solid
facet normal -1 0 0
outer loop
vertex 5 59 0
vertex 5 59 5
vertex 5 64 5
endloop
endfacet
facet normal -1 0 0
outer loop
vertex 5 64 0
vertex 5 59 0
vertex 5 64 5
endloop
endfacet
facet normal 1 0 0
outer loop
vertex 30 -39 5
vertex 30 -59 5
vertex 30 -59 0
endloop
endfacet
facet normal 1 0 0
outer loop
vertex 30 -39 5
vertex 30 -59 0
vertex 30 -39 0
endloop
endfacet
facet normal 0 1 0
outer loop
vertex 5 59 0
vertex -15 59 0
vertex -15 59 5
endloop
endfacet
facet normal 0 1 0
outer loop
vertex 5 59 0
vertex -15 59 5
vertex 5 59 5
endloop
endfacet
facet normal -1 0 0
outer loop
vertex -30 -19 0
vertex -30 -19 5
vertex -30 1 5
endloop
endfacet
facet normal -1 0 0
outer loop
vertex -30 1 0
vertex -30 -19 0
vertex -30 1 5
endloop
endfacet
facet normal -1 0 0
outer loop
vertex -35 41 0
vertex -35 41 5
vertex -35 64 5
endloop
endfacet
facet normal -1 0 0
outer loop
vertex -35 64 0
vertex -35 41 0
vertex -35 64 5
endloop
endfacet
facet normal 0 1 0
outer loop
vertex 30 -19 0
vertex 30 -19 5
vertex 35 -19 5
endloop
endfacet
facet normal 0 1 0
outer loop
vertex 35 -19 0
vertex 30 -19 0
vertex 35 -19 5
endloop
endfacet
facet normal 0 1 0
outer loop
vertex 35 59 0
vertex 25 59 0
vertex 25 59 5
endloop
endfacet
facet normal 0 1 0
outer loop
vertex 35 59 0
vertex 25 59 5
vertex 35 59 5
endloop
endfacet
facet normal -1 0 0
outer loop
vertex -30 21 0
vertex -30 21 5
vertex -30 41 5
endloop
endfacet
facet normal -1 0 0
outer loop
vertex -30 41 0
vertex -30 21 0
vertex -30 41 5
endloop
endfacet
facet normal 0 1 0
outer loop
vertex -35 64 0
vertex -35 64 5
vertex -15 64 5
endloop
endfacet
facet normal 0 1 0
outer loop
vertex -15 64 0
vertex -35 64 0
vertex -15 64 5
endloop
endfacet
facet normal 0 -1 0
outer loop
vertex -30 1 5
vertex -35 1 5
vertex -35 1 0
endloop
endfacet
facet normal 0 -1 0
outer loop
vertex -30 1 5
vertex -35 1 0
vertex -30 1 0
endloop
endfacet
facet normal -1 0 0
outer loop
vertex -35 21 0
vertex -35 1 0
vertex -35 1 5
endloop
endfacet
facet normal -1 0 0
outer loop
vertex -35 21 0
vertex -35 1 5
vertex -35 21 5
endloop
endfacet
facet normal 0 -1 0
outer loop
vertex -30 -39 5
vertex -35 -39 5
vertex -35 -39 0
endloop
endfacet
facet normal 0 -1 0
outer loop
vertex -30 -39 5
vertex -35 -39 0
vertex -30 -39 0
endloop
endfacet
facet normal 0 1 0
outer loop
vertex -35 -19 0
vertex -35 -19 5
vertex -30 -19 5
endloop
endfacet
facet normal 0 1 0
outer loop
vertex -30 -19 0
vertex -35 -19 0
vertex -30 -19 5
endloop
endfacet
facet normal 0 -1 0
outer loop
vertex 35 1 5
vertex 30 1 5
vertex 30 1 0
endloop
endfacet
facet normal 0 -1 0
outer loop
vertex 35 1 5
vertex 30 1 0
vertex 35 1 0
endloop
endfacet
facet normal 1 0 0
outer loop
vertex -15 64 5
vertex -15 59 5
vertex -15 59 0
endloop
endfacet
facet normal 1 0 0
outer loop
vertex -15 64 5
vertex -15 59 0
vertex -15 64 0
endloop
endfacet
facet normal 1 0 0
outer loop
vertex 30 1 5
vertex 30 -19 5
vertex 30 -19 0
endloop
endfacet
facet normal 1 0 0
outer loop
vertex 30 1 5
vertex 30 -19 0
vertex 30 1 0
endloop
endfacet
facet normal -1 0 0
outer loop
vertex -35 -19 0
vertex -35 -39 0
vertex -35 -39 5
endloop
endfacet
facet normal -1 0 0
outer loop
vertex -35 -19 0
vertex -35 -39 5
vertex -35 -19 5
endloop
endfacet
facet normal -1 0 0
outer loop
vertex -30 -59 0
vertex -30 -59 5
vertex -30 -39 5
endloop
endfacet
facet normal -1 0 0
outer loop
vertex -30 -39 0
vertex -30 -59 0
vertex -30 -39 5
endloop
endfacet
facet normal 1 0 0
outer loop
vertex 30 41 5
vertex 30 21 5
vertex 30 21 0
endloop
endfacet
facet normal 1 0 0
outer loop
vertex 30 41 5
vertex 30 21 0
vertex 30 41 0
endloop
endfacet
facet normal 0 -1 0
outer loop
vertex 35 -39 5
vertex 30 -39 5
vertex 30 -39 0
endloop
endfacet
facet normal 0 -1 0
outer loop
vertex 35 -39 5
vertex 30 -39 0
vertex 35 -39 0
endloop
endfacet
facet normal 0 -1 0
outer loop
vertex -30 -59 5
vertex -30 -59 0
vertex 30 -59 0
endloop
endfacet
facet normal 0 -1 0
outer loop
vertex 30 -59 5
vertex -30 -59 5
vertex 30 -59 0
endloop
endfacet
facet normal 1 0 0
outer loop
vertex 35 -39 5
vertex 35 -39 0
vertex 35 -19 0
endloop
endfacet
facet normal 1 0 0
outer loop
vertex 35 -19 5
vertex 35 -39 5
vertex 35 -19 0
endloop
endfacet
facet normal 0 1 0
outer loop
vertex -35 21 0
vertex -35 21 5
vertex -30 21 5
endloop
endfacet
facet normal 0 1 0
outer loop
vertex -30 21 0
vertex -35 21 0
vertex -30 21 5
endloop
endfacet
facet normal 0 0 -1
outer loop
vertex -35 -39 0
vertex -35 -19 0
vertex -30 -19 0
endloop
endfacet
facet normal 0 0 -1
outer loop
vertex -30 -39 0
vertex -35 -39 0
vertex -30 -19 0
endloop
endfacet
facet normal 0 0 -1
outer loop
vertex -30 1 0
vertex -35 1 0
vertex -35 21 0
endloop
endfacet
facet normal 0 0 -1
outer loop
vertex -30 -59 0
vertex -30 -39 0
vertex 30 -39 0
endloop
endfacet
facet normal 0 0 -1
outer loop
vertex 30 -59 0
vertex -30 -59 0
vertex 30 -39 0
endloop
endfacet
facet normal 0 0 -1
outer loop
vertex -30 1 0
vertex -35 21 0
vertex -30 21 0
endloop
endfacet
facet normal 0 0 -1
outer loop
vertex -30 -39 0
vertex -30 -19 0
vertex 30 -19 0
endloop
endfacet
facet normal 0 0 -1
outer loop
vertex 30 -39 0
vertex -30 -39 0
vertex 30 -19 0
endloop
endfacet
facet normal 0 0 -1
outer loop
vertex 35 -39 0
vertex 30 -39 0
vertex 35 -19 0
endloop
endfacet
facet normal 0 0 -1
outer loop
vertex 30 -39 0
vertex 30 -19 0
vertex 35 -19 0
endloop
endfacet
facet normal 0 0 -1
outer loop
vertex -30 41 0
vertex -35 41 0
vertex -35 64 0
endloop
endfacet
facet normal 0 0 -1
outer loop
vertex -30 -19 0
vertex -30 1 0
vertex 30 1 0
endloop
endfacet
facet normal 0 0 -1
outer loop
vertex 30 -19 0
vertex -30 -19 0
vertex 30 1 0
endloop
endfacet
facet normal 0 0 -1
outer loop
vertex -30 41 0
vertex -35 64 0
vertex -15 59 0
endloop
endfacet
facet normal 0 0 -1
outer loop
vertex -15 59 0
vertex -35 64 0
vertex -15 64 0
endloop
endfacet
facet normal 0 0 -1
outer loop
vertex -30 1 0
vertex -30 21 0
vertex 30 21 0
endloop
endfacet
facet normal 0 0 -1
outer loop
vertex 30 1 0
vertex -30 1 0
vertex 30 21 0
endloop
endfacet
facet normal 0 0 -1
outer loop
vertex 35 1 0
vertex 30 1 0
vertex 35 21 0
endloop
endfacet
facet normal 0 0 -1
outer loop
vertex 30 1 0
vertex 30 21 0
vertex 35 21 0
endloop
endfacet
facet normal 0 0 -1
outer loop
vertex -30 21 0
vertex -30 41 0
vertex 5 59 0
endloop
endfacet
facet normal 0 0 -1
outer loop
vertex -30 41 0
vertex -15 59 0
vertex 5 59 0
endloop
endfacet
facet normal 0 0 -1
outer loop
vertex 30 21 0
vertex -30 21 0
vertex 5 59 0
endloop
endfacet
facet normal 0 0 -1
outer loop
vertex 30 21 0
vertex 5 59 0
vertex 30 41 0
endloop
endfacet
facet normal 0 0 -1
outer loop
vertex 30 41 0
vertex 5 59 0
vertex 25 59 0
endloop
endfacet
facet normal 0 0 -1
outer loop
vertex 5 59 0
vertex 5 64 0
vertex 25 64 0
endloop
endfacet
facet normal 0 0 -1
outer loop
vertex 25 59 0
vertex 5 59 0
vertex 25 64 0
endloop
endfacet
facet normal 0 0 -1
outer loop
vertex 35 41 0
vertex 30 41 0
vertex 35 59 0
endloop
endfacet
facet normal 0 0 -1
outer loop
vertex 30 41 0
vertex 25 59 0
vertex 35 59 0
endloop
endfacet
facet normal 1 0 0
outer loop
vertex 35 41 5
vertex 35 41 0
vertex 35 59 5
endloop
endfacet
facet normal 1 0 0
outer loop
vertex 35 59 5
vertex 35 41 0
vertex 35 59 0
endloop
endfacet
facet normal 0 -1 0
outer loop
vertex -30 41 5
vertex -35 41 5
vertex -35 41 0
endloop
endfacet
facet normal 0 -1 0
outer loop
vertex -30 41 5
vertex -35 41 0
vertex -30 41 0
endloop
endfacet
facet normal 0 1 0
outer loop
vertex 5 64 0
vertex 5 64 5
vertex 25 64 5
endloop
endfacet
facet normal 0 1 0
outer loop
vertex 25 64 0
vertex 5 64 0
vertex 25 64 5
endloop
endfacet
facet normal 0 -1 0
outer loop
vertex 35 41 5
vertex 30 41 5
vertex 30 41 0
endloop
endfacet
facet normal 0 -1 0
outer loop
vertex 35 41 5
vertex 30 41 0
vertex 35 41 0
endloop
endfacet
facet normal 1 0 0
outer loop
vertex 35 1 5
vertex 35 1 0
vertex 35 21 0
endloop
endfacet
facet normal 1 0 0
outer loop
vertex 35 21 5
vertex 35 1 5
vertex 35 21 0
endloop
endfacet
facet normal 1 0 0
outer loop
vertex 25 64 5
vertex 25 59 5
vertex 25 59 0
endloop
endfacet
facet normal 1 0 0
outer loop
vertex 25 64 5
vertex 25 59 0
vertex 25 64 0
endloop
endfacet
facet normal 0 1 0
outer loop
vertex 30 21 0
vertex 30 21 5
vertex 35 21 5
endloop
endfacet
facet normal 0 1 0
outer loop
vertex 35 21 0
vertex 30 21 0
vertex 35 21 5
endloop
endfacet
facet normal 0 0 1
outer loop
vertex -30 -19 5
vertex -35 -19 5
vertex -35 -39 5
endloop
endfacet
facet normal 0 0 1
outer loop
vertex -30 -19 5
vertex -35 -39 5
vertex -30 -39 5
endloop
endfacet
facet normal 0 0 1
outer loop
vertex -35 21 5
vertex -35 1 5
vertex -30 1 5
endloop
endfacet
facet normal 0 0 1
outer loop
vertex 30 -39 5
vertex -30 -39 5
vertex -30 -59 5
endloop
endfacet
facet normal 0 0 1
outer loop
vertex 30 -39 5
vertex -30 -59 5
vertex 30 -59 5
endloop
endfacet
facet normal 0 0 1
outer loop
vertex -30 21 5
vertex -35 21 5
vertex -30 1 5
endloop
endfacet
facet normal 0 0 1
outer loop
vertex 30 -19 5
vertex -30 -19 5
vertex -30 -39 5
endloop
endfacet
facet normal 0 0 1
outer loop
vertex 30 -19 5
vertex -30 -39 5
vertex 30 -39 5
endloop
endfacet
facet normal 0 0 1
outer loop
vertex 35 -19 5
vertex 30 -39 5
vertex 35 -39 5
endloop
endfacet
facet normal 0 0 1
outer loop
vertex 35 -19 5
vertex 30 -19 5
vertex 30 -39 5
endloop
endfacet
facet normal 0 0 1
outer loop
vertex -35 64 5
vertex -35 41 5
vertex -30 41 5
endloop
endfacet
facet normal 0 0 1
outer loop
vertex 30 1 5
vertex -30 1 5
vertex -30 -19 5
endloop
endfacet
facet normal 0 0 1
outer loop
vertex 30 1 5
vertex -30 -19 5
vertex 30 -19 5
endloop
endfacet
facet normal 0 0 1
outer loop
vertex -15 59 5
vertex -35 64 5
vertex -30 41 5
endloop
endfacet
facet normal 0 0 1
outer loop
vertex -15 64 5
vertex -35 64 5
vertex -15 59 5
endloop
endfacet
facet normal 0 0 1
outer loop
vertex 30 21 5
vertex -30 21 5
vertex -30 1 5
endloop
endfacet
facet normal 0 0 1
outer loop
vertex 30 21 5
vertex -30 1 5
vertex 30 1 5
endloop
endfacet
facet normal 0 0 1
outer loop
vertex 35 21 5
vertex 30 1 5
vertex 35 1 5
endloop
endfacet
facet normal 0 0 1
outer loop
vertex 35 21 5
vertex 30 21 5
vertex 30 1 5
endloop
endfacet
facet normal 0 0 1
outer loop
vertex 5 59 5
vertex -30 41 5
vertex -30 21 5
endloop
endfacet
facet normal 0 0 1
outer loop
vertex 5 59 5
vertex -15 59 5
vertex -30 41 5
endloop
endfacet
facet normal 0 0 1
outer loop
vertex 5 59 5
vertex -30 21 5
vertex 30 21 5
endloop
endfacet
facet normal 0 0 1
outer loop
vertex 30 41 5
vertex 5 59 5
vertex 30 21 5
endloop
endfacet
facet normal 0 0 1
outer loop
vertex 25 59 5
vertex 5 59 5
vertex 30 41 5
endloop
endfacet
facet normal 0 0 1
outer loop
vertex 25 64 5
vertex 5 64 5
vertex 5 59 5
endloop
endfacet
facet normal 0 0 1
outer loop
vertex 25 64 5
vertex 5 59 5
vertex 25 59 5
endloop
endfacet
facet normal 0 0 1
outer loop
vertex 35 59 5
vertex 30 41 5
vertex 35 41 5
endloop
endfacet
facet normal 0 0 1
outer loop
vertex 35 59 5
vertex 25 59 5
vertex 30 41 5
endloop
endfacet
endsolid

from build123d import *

# Parameters (mm, degrees)
SKETCH_1_W                      = 70
SKETCH_1_H                      = 118
EXTRUDE_1_DEPTH                 = 5
CUT_EXTRUDE_1_REACH             = 70.782
SKETCH_2_W                      = 5
SKETCH_2_H                      = 20
CUT_EXTRUDE_1_DIRECTION_2_DEPTH = 69.782265156
PATTERN_LINEAR_1_COUNT          = 3
PATTERN_LINEAR_1_PITCH          = 40
CUT_EXTRUDE_3_REACH             = 70.782
SKETCH_4_W                      = 5
SKETCH_4_H                      = 20
PATTERN_LINEAR_4_COUNT          = 3
PATTERN_LINEAR_4_PITCH          = 40
SKETCH_3_W                      = 20
SKETCH_3_H                      = 5
EXTRUDE_2_DEPTH                 = 5
PATTERN_LINEAR_5_COUNT          = 2
PATTERN_LINEAR_5_PITCH          = 40


with BuildPart() as part:
    # 스케치1 → 보스-돌출1 (new body)
    with BuildSketch(Plane.XY):
        Rectangle(SKETCH_1_W, SKETCH_1_H)
    extrude(amount=EXTRUDE_1_DEPTH)

    # 스케치2 → 컷-돌출1 (cut, up to next)
    with BuildSketch(Plane.XY.offset(5), mode=Mode.PRIVATE) as cut_extrude_1_sk1:
        with Locations((-32.5, -49)):
            Rectangle(SKETCH_2_W, SKETCH_2_H)
    cut_extrude_1_tool1 = extrude(cut_extrude_1_sk1.sketch, amount=-CUT_EXTRUDE_1_REACH, mode=Mode.PRIVATE) & part.part
    cut_extrude_1 = cut_extrude_1_tool1.solids().sort_by_distance((-32.5, -49, 5))[0]
    add(cut_extrude_1, mode=Mode.SUBTRACT)

    # 스케치2 → 컷-돌출1 direction 2 (cut)
    with BuildSketch(Plane.XY.offset(5)):
        with Locations((-32.5, -49)):
            Rectangle(SKETCH_2_W, SKETCH_2_H)
    cut_extrude_1_direction_2 = extrude(amount=CUT_EXTRUDE_1_DIRECTION_2_DEPTH, mode=Mode.SUBTRACT)

    # 선형 패턴1: 컷-돌출1, 컷-돌출1 direction 2 ×3
    with Locations(*[(0, i * PATTERN_LINEAR_1_PITCH, 0) for i in range(1, PATTERN_LINEAR_1_COUNT)]):
        add(cut_extrude_1, mode=Mode.SUBTRACT)
        add(cut_extrude_1_direction_2, mode=Mode.SUBTRACT)

    # 스케치4 → 컷-돌출3 (cut, up to next)
    with BuildSketch(Plane.XY.offset(5), mode=Mode.PRIVATE) as cut_extrude_3_sk1:
        with Locations((32.5, -49)):
            Rectangle(SKETCH_4_W, SKETCH_4_H)
    cut_extrude_3_tool1 = extrude(cut_extrude_3_sk1.sketch, amount=-CUT_EXTRUDE_3_REACH, mode=Mode.PRIVATE) & part.part
    cut_extrude_3 = cut_extrude_3_tool1.solids().sort_by_distance((32.5, -49, 5))[0]
    add(cut_extrude_3, mode=Mode.SUBTRACT)

    # 선형 패턴4: 컷-돌출3 ×3
    with Locations(*[(0, i * PATTERN_LINEAR_4_PITCH, 0) for i in range(1, PATTERN_LINEAR_4_COUNT)]):
        add(cut_extrude_3, mode=Mode.SUBTRACT)

    # 스케치3 → 보스-돌출2 (add)
    with BuildSketch(Plane.XY.offset(5)):
        with Locations((-25, 61.5)):
            Rectangle(SKETCH_3_W, SKETCH_3_H)
    extrude_2 = extrude(amount=-EXTRUDE_2_DEPTH)

    # 선형 패턴5: 보스-돌출2 ×2
    with Locations(*[(i * PATTERN_LINEAR_5_PITCH, 0, 0) for i in range(1, PATTERN_LINEAR_5_COUNT)]):
        add(extrude_2)


solid = part.part
